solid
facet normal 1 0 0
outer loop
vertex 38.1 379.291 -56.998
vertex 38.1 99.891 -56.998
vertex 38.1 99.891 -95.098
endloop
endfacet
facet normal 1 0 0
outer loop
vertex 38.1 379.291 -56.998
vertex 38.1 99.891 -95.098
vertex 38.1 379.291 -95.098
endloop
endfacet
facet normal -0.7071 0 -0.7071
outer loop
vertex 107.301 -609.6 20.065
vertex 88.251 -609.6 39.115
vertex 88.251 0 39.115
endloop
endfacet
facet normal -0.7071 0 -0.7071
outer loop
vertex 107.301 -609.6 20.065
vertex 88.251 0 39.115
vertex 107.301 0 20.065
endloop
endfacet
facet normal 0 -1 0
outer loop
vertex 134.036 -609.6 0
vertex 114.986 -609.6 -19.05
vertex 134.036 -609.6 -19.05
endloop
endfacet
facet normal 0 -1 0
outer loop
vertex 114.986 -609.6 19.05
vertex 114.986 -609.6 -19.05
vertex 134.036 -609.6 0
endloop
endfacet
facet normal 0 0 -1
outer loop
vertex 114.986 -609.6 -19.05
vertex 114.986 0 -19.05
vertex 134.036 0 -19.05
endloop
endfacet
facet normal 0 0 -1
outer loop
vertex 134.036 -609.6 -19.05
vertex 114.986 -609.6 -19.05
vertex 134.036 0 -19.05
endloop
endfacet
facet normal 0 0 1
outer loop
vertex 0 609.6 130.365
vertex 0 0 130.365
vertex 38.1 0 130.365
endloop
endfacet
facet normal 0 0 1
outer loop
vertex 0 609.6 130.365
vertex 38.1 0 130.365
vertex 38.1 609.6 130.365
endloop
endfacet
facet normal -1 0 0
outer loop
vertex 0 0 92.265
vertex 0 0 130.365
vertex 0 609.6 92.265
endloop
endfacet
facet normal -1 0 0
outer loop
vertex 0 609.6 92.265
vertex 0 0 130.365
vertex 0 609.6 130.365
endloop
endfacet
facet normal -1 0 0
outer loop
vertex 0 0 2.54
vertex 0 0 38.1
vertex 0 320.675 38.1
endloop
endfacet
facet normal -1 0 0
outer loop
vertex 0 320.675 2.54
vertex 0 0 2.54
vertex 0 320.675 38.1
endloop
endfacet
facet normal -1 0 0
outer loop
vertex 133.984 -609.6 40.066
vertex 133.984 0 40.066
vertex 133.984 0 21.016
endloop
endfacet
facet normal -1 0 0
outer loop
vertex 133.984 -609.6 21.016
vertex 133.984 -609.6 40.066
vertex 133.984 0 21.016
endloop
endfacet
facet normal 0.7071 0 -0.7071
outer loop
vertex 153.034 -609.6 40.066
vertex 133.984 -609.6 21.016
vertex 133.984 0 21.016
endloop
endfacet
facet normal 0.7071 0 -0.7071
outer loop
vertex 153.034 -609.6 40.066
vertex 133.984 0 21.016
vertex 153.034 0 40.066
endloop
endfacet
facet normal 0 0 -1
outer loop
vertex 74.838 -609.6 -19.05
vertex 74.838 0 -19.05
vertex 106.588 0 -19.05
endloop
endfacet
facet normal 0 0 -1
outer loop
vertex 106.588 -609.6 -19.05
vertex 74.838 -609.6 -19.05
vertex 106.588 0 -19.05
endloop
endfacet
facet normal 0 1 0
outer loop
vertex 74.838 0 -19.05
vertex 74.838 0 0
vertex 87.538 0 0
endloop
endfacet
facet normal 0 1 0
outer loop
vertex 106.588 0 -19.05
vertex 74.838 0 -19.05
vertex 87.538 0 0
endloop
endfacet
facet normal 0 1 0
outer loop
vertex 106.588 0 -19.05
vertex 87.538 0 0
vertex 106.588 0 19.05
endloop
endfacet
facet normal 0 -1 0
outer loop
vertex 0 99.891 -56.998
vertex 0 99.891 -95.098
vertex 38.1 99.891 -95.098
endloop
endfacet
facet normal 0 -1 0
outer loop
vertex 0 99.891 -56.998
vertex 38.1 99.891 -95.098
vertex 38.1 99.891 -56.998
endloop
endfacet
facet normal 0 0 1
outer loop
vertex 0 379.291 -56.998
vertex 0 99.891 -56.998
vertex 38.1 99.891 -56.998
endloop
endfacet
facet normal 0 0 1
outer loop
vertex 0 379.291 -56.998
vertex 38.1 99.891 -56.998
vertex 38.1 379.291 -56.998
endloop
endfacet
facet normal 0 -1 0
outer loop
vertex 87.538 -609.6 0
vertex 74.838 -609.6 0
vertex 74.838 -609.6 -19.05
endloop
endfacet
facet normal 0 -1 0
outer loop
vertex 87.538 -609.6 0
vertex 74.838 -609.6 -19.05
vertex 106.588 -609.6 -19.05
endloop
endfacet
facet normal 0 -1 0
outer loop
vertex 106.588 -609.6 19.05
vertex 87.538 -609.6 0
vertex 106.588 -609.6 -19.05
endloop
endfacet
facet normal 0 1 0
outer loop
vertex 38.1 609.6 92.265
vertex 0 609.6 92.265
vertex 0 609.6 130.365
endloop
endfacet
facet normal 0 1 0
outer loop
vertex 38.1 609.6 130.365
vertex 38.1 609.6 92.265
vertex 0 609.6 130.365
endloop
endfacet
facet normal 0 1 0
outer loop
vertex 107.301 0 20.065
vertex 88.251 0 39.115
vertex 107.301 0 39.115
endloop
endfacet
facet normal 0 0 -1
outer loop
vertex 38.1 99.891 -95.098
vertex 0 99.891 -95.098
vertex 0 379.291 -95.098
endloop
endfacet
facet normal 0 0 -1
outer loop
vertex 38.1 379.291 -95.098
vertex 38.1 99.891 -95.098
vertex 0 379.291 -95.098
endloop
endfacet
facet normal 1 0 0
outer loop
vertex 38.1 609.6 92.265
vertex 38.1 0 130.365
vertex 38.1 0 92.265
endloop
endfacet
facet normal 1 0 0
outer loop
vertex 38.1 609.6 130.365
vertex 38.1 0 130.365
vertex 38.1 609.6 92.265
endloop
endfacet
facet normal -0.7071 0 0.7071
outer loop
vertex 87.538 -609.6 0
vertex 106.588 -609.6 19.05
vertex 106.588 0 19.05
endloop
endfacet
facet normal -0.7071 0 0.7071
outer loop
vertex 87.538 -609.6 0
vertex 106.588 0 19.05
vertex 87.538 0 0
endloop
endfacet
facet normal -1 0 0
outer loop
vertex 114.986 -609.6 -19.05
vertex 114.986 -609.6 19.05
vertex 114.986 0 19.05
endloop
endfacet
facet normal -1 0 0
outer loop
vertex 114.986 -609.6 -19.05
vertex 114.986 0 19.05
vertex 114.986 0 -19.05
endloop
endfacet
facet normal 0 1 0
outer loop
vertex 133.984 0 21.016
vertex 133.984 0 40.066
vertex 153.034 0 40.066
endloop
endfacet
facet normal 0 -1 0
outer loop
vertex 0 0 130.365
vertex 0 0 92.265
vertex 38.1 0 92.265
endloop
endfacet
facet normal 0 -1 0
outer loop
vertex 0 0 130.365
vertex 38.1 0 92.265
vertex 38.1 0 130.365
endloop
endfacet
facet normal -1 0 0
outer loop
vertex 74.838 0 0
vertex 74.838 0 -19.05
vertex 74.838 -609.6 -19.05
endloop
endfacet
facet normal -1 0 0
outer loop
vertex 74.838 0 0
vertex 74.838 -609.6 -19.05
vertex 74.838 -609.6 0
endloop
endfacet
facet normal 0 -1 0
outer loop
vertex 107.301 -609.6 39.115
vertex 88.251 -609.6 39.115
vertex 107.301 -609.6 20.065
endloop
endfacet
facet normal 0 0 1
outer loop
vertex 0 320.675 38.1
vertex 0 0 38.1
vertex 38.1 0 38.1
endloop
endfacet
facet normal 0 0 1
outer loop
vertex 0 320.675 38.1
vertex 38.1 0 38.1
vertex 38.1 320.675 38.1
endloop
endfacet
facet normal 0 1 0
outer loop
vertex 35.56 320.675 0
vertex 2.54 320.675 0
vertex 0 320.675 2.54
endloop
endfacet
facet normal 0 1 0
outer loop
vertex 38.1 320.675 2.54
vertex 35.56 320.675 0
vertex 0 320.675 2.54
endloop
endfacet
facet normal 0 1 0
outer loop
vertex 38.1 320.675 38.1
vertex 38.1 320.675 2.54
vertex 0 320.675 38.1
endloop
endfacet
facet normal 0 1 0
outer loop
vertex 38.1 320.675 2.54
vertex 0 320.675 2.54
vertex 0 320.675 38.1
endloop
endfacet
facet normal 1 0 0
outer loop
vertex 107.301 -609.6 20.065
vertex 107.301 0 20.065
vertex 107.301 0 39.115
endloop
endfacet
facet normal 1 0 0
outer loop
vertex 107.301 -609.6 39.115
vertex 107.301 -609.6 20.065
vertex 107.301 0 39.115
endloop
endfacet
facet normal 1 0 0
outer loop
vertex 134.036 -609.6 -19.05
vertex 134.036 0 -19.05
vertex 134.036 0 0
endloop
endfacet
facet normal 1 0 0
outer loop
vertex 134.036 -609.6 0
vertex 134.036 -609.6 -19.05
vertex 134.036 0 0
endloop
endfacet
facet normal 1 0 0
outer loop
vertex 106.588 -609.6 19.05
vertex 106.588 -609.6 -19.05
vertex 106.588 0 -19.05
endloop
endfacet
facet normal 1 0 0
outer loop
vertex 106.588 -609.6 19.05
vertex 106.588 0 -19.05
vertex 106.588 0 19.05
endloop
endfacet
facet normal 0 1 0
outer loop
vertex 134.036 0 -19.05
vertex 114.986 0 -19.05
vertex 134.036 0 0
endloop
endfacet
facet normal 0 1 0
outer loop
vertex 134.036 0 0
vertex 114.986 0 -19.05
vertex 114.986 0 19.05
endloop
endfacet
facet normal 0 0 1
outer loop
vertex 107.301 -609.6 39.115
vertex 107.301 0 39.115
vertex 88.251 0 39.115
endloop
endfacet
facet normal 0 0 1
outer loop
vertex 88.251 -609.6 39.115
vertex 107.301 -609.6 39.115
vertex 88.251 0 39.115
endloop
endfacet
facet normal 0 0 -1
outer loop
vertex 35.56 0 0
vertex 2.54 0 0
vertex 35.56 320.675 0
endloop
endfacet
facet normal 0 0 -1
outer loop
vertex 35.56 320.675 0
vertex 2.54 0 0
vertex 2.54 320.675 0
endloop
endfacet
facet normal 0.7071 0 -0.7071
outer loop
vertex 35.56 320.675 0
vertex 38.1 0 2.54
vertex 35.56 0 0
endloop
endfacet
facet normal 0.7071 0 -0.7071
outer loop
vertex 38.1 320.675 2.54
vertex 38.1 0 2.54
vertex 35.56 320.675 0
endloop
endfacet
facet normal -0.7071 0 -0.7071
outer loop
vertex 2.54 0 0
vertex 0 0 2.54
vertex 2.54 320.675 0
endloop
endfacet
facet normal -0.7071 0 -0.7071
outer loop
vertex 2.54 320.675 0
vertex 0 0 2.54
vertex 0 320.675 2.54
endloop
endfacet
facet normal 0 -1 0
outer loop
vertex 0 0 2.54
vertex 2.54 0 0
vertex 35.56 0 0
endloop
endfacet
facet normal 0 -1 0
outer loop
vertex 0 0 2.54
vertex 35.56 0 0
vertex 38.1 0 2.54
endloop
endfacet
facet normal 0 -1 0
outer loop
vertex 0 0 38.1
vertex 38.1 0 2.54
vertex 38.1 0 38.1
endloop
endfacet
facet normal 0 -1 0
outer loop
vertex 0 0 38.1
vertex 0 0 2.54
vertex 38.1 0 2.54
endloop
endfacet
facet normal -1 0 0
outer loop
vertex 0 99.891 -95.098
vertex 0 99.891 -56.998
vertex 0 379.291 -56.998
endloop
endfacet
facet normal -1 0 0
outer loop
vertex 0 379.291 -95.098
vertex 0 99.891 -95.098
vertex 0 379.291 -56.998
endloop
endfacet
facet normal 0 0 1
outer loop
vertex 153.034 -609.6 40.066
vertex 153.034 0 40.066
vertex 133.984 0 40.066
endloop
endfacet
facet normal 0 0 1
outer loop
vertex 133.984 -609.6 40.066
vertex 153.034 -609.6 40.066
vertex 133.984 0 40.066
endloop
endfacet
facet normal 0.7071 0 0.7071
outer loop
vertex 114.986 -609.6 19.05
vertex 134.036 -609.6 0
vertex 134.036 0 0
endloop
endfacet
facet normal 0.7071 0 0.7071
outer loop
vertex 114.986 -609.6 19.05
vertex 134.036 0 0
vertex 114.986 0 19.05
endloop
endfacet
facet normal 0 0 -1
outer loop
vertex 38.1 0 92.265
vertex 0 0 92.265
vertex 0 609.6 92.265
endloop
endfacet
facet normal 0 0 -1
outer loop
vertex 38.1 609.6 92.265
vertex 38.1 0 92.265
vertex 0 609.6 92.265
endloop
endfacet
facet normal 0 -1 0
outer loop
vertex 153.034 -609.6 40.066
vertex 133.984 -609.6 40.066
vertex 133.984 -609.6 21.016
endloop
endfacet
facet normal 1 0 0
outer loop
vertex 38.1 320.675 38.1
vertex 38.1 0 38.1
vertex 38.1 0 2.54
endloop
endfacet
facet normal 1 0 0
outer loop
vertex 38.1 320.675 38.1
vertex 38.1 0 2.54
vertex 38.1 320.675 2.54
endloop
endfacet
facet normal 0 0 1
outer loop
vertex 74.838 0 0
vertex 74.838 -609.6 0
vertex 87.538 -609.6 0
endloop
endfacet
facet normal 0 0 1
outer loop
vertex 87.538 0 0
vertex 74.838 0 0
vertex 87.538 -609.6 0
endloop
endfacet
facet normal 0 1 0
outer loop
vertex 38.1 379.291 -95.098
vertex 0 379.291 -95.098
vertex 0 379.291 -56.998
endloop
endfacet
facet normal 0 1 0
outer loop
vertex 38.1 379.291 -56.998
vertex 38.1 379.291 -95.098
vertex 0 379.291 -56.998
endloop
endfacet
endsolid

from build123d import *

# Parameters (mm, degrees)
F0_W      = 320.675
F0_H      = 38.1
F1_DEPTH  = 38.1
F2_SIZE   = 2.54
F3_W      = 609.6
F3_H      = 38.1
F4_DEPTH  = 38.1
F5_W      = 279.4
F5_H      = 38.1
F6_DEPTH  = 38.1
F7_W      = 19.05
F7_H      = 19.05
F8_DEPTH  = 609.6
F9_W      = 12.7
F9_H      = 19.05
F10_DEPTH = 609.6
F12_DEPTH = 609.6
F14_DEPTH = 609.6


with BuildPart() as f1:
    # F0 (on Right) → F1 (new body)
    with BuildSketch(Plane.YZ):
        with Locations((160.3375, 19.05)):
            Rectangle(F0_W, F0_H)
    extrude(amount=F1_DEPTH)

    # F2
    f2_edges = [f1.edges().sort_by_distance(p)[0] for p in [
        (38.1, 160.3375, 0),
        (0, 160.3375, 0),
    ]]
    chamfer(f2_edges, length=F2_SIZE)


with BuildPart() as f4:
    # F3 (on Right) → F4 (new body)
    with BuildSketch(Plane.YZ):
        with Locations((304.8, 111.315129)):
            Rectangle(F3_W, F3_H)
    extrude(amount=F4_DEPTH)


with BuildPart() as f6:
    # F5 (on Right) → F6 (new body)
    with BuildSketch(Plane.YZ):
        with Locations((239.591385, -76.047654)):
            Rectangle(F5_W, F5_H)
    extrude(amount=F6_DEPTH)


with BuildPart() as f8:
    # F7 (on Front) → F8 (new body)
    with BuildSketch(Plane.XZ):
        Polygon((114.986017, 19.05), (114.986017, 0), (134.036017, 0), align=None)
        with Locations((124.511017, -9.525)):
            Rectangle(F7_W, F7_H)
    extrude(amount=F8_DEPTH)


with BuildPart() as f10:
    # F9 (on Front) → F10 (new body)
    with BuildSketch(Plane.XZ):
        Polygon((87.538339, 0), (87.538339, -19.05), (106.588339, -19.05), (106.588339, 0), (106.588339, 19.05), align=None)
        with Locations((81.188339, -9.525)):
            Rectangle(F9_W, F9_H)
    extrude(amount=F10_DEPTH)


with BuildPart() as f12:
    # F11 (on Front) → F12 (new body)
    with BuildSketch(Plane.XZ):
        Polygon((107.300756, 39.11522), (88.250756, 39.11522), (107.300756, 20.06522), align=None)
    extrude(amount=F12_DEPTH)


with BuildPart() as f14:
    # F13 (on Front) → F14 (new body)
    with BuildSketch(Plane.XZ):
        Polygon((153.033672, 40.065681), (133.983672, 40.065681), (133.983672, 21.015681), align=None)
    extrude(amount=F14_DEPTH)


solid = Compound([f1.part, f4.part, f6.part, f8.part, f10.part, f12.part, f14.part])
